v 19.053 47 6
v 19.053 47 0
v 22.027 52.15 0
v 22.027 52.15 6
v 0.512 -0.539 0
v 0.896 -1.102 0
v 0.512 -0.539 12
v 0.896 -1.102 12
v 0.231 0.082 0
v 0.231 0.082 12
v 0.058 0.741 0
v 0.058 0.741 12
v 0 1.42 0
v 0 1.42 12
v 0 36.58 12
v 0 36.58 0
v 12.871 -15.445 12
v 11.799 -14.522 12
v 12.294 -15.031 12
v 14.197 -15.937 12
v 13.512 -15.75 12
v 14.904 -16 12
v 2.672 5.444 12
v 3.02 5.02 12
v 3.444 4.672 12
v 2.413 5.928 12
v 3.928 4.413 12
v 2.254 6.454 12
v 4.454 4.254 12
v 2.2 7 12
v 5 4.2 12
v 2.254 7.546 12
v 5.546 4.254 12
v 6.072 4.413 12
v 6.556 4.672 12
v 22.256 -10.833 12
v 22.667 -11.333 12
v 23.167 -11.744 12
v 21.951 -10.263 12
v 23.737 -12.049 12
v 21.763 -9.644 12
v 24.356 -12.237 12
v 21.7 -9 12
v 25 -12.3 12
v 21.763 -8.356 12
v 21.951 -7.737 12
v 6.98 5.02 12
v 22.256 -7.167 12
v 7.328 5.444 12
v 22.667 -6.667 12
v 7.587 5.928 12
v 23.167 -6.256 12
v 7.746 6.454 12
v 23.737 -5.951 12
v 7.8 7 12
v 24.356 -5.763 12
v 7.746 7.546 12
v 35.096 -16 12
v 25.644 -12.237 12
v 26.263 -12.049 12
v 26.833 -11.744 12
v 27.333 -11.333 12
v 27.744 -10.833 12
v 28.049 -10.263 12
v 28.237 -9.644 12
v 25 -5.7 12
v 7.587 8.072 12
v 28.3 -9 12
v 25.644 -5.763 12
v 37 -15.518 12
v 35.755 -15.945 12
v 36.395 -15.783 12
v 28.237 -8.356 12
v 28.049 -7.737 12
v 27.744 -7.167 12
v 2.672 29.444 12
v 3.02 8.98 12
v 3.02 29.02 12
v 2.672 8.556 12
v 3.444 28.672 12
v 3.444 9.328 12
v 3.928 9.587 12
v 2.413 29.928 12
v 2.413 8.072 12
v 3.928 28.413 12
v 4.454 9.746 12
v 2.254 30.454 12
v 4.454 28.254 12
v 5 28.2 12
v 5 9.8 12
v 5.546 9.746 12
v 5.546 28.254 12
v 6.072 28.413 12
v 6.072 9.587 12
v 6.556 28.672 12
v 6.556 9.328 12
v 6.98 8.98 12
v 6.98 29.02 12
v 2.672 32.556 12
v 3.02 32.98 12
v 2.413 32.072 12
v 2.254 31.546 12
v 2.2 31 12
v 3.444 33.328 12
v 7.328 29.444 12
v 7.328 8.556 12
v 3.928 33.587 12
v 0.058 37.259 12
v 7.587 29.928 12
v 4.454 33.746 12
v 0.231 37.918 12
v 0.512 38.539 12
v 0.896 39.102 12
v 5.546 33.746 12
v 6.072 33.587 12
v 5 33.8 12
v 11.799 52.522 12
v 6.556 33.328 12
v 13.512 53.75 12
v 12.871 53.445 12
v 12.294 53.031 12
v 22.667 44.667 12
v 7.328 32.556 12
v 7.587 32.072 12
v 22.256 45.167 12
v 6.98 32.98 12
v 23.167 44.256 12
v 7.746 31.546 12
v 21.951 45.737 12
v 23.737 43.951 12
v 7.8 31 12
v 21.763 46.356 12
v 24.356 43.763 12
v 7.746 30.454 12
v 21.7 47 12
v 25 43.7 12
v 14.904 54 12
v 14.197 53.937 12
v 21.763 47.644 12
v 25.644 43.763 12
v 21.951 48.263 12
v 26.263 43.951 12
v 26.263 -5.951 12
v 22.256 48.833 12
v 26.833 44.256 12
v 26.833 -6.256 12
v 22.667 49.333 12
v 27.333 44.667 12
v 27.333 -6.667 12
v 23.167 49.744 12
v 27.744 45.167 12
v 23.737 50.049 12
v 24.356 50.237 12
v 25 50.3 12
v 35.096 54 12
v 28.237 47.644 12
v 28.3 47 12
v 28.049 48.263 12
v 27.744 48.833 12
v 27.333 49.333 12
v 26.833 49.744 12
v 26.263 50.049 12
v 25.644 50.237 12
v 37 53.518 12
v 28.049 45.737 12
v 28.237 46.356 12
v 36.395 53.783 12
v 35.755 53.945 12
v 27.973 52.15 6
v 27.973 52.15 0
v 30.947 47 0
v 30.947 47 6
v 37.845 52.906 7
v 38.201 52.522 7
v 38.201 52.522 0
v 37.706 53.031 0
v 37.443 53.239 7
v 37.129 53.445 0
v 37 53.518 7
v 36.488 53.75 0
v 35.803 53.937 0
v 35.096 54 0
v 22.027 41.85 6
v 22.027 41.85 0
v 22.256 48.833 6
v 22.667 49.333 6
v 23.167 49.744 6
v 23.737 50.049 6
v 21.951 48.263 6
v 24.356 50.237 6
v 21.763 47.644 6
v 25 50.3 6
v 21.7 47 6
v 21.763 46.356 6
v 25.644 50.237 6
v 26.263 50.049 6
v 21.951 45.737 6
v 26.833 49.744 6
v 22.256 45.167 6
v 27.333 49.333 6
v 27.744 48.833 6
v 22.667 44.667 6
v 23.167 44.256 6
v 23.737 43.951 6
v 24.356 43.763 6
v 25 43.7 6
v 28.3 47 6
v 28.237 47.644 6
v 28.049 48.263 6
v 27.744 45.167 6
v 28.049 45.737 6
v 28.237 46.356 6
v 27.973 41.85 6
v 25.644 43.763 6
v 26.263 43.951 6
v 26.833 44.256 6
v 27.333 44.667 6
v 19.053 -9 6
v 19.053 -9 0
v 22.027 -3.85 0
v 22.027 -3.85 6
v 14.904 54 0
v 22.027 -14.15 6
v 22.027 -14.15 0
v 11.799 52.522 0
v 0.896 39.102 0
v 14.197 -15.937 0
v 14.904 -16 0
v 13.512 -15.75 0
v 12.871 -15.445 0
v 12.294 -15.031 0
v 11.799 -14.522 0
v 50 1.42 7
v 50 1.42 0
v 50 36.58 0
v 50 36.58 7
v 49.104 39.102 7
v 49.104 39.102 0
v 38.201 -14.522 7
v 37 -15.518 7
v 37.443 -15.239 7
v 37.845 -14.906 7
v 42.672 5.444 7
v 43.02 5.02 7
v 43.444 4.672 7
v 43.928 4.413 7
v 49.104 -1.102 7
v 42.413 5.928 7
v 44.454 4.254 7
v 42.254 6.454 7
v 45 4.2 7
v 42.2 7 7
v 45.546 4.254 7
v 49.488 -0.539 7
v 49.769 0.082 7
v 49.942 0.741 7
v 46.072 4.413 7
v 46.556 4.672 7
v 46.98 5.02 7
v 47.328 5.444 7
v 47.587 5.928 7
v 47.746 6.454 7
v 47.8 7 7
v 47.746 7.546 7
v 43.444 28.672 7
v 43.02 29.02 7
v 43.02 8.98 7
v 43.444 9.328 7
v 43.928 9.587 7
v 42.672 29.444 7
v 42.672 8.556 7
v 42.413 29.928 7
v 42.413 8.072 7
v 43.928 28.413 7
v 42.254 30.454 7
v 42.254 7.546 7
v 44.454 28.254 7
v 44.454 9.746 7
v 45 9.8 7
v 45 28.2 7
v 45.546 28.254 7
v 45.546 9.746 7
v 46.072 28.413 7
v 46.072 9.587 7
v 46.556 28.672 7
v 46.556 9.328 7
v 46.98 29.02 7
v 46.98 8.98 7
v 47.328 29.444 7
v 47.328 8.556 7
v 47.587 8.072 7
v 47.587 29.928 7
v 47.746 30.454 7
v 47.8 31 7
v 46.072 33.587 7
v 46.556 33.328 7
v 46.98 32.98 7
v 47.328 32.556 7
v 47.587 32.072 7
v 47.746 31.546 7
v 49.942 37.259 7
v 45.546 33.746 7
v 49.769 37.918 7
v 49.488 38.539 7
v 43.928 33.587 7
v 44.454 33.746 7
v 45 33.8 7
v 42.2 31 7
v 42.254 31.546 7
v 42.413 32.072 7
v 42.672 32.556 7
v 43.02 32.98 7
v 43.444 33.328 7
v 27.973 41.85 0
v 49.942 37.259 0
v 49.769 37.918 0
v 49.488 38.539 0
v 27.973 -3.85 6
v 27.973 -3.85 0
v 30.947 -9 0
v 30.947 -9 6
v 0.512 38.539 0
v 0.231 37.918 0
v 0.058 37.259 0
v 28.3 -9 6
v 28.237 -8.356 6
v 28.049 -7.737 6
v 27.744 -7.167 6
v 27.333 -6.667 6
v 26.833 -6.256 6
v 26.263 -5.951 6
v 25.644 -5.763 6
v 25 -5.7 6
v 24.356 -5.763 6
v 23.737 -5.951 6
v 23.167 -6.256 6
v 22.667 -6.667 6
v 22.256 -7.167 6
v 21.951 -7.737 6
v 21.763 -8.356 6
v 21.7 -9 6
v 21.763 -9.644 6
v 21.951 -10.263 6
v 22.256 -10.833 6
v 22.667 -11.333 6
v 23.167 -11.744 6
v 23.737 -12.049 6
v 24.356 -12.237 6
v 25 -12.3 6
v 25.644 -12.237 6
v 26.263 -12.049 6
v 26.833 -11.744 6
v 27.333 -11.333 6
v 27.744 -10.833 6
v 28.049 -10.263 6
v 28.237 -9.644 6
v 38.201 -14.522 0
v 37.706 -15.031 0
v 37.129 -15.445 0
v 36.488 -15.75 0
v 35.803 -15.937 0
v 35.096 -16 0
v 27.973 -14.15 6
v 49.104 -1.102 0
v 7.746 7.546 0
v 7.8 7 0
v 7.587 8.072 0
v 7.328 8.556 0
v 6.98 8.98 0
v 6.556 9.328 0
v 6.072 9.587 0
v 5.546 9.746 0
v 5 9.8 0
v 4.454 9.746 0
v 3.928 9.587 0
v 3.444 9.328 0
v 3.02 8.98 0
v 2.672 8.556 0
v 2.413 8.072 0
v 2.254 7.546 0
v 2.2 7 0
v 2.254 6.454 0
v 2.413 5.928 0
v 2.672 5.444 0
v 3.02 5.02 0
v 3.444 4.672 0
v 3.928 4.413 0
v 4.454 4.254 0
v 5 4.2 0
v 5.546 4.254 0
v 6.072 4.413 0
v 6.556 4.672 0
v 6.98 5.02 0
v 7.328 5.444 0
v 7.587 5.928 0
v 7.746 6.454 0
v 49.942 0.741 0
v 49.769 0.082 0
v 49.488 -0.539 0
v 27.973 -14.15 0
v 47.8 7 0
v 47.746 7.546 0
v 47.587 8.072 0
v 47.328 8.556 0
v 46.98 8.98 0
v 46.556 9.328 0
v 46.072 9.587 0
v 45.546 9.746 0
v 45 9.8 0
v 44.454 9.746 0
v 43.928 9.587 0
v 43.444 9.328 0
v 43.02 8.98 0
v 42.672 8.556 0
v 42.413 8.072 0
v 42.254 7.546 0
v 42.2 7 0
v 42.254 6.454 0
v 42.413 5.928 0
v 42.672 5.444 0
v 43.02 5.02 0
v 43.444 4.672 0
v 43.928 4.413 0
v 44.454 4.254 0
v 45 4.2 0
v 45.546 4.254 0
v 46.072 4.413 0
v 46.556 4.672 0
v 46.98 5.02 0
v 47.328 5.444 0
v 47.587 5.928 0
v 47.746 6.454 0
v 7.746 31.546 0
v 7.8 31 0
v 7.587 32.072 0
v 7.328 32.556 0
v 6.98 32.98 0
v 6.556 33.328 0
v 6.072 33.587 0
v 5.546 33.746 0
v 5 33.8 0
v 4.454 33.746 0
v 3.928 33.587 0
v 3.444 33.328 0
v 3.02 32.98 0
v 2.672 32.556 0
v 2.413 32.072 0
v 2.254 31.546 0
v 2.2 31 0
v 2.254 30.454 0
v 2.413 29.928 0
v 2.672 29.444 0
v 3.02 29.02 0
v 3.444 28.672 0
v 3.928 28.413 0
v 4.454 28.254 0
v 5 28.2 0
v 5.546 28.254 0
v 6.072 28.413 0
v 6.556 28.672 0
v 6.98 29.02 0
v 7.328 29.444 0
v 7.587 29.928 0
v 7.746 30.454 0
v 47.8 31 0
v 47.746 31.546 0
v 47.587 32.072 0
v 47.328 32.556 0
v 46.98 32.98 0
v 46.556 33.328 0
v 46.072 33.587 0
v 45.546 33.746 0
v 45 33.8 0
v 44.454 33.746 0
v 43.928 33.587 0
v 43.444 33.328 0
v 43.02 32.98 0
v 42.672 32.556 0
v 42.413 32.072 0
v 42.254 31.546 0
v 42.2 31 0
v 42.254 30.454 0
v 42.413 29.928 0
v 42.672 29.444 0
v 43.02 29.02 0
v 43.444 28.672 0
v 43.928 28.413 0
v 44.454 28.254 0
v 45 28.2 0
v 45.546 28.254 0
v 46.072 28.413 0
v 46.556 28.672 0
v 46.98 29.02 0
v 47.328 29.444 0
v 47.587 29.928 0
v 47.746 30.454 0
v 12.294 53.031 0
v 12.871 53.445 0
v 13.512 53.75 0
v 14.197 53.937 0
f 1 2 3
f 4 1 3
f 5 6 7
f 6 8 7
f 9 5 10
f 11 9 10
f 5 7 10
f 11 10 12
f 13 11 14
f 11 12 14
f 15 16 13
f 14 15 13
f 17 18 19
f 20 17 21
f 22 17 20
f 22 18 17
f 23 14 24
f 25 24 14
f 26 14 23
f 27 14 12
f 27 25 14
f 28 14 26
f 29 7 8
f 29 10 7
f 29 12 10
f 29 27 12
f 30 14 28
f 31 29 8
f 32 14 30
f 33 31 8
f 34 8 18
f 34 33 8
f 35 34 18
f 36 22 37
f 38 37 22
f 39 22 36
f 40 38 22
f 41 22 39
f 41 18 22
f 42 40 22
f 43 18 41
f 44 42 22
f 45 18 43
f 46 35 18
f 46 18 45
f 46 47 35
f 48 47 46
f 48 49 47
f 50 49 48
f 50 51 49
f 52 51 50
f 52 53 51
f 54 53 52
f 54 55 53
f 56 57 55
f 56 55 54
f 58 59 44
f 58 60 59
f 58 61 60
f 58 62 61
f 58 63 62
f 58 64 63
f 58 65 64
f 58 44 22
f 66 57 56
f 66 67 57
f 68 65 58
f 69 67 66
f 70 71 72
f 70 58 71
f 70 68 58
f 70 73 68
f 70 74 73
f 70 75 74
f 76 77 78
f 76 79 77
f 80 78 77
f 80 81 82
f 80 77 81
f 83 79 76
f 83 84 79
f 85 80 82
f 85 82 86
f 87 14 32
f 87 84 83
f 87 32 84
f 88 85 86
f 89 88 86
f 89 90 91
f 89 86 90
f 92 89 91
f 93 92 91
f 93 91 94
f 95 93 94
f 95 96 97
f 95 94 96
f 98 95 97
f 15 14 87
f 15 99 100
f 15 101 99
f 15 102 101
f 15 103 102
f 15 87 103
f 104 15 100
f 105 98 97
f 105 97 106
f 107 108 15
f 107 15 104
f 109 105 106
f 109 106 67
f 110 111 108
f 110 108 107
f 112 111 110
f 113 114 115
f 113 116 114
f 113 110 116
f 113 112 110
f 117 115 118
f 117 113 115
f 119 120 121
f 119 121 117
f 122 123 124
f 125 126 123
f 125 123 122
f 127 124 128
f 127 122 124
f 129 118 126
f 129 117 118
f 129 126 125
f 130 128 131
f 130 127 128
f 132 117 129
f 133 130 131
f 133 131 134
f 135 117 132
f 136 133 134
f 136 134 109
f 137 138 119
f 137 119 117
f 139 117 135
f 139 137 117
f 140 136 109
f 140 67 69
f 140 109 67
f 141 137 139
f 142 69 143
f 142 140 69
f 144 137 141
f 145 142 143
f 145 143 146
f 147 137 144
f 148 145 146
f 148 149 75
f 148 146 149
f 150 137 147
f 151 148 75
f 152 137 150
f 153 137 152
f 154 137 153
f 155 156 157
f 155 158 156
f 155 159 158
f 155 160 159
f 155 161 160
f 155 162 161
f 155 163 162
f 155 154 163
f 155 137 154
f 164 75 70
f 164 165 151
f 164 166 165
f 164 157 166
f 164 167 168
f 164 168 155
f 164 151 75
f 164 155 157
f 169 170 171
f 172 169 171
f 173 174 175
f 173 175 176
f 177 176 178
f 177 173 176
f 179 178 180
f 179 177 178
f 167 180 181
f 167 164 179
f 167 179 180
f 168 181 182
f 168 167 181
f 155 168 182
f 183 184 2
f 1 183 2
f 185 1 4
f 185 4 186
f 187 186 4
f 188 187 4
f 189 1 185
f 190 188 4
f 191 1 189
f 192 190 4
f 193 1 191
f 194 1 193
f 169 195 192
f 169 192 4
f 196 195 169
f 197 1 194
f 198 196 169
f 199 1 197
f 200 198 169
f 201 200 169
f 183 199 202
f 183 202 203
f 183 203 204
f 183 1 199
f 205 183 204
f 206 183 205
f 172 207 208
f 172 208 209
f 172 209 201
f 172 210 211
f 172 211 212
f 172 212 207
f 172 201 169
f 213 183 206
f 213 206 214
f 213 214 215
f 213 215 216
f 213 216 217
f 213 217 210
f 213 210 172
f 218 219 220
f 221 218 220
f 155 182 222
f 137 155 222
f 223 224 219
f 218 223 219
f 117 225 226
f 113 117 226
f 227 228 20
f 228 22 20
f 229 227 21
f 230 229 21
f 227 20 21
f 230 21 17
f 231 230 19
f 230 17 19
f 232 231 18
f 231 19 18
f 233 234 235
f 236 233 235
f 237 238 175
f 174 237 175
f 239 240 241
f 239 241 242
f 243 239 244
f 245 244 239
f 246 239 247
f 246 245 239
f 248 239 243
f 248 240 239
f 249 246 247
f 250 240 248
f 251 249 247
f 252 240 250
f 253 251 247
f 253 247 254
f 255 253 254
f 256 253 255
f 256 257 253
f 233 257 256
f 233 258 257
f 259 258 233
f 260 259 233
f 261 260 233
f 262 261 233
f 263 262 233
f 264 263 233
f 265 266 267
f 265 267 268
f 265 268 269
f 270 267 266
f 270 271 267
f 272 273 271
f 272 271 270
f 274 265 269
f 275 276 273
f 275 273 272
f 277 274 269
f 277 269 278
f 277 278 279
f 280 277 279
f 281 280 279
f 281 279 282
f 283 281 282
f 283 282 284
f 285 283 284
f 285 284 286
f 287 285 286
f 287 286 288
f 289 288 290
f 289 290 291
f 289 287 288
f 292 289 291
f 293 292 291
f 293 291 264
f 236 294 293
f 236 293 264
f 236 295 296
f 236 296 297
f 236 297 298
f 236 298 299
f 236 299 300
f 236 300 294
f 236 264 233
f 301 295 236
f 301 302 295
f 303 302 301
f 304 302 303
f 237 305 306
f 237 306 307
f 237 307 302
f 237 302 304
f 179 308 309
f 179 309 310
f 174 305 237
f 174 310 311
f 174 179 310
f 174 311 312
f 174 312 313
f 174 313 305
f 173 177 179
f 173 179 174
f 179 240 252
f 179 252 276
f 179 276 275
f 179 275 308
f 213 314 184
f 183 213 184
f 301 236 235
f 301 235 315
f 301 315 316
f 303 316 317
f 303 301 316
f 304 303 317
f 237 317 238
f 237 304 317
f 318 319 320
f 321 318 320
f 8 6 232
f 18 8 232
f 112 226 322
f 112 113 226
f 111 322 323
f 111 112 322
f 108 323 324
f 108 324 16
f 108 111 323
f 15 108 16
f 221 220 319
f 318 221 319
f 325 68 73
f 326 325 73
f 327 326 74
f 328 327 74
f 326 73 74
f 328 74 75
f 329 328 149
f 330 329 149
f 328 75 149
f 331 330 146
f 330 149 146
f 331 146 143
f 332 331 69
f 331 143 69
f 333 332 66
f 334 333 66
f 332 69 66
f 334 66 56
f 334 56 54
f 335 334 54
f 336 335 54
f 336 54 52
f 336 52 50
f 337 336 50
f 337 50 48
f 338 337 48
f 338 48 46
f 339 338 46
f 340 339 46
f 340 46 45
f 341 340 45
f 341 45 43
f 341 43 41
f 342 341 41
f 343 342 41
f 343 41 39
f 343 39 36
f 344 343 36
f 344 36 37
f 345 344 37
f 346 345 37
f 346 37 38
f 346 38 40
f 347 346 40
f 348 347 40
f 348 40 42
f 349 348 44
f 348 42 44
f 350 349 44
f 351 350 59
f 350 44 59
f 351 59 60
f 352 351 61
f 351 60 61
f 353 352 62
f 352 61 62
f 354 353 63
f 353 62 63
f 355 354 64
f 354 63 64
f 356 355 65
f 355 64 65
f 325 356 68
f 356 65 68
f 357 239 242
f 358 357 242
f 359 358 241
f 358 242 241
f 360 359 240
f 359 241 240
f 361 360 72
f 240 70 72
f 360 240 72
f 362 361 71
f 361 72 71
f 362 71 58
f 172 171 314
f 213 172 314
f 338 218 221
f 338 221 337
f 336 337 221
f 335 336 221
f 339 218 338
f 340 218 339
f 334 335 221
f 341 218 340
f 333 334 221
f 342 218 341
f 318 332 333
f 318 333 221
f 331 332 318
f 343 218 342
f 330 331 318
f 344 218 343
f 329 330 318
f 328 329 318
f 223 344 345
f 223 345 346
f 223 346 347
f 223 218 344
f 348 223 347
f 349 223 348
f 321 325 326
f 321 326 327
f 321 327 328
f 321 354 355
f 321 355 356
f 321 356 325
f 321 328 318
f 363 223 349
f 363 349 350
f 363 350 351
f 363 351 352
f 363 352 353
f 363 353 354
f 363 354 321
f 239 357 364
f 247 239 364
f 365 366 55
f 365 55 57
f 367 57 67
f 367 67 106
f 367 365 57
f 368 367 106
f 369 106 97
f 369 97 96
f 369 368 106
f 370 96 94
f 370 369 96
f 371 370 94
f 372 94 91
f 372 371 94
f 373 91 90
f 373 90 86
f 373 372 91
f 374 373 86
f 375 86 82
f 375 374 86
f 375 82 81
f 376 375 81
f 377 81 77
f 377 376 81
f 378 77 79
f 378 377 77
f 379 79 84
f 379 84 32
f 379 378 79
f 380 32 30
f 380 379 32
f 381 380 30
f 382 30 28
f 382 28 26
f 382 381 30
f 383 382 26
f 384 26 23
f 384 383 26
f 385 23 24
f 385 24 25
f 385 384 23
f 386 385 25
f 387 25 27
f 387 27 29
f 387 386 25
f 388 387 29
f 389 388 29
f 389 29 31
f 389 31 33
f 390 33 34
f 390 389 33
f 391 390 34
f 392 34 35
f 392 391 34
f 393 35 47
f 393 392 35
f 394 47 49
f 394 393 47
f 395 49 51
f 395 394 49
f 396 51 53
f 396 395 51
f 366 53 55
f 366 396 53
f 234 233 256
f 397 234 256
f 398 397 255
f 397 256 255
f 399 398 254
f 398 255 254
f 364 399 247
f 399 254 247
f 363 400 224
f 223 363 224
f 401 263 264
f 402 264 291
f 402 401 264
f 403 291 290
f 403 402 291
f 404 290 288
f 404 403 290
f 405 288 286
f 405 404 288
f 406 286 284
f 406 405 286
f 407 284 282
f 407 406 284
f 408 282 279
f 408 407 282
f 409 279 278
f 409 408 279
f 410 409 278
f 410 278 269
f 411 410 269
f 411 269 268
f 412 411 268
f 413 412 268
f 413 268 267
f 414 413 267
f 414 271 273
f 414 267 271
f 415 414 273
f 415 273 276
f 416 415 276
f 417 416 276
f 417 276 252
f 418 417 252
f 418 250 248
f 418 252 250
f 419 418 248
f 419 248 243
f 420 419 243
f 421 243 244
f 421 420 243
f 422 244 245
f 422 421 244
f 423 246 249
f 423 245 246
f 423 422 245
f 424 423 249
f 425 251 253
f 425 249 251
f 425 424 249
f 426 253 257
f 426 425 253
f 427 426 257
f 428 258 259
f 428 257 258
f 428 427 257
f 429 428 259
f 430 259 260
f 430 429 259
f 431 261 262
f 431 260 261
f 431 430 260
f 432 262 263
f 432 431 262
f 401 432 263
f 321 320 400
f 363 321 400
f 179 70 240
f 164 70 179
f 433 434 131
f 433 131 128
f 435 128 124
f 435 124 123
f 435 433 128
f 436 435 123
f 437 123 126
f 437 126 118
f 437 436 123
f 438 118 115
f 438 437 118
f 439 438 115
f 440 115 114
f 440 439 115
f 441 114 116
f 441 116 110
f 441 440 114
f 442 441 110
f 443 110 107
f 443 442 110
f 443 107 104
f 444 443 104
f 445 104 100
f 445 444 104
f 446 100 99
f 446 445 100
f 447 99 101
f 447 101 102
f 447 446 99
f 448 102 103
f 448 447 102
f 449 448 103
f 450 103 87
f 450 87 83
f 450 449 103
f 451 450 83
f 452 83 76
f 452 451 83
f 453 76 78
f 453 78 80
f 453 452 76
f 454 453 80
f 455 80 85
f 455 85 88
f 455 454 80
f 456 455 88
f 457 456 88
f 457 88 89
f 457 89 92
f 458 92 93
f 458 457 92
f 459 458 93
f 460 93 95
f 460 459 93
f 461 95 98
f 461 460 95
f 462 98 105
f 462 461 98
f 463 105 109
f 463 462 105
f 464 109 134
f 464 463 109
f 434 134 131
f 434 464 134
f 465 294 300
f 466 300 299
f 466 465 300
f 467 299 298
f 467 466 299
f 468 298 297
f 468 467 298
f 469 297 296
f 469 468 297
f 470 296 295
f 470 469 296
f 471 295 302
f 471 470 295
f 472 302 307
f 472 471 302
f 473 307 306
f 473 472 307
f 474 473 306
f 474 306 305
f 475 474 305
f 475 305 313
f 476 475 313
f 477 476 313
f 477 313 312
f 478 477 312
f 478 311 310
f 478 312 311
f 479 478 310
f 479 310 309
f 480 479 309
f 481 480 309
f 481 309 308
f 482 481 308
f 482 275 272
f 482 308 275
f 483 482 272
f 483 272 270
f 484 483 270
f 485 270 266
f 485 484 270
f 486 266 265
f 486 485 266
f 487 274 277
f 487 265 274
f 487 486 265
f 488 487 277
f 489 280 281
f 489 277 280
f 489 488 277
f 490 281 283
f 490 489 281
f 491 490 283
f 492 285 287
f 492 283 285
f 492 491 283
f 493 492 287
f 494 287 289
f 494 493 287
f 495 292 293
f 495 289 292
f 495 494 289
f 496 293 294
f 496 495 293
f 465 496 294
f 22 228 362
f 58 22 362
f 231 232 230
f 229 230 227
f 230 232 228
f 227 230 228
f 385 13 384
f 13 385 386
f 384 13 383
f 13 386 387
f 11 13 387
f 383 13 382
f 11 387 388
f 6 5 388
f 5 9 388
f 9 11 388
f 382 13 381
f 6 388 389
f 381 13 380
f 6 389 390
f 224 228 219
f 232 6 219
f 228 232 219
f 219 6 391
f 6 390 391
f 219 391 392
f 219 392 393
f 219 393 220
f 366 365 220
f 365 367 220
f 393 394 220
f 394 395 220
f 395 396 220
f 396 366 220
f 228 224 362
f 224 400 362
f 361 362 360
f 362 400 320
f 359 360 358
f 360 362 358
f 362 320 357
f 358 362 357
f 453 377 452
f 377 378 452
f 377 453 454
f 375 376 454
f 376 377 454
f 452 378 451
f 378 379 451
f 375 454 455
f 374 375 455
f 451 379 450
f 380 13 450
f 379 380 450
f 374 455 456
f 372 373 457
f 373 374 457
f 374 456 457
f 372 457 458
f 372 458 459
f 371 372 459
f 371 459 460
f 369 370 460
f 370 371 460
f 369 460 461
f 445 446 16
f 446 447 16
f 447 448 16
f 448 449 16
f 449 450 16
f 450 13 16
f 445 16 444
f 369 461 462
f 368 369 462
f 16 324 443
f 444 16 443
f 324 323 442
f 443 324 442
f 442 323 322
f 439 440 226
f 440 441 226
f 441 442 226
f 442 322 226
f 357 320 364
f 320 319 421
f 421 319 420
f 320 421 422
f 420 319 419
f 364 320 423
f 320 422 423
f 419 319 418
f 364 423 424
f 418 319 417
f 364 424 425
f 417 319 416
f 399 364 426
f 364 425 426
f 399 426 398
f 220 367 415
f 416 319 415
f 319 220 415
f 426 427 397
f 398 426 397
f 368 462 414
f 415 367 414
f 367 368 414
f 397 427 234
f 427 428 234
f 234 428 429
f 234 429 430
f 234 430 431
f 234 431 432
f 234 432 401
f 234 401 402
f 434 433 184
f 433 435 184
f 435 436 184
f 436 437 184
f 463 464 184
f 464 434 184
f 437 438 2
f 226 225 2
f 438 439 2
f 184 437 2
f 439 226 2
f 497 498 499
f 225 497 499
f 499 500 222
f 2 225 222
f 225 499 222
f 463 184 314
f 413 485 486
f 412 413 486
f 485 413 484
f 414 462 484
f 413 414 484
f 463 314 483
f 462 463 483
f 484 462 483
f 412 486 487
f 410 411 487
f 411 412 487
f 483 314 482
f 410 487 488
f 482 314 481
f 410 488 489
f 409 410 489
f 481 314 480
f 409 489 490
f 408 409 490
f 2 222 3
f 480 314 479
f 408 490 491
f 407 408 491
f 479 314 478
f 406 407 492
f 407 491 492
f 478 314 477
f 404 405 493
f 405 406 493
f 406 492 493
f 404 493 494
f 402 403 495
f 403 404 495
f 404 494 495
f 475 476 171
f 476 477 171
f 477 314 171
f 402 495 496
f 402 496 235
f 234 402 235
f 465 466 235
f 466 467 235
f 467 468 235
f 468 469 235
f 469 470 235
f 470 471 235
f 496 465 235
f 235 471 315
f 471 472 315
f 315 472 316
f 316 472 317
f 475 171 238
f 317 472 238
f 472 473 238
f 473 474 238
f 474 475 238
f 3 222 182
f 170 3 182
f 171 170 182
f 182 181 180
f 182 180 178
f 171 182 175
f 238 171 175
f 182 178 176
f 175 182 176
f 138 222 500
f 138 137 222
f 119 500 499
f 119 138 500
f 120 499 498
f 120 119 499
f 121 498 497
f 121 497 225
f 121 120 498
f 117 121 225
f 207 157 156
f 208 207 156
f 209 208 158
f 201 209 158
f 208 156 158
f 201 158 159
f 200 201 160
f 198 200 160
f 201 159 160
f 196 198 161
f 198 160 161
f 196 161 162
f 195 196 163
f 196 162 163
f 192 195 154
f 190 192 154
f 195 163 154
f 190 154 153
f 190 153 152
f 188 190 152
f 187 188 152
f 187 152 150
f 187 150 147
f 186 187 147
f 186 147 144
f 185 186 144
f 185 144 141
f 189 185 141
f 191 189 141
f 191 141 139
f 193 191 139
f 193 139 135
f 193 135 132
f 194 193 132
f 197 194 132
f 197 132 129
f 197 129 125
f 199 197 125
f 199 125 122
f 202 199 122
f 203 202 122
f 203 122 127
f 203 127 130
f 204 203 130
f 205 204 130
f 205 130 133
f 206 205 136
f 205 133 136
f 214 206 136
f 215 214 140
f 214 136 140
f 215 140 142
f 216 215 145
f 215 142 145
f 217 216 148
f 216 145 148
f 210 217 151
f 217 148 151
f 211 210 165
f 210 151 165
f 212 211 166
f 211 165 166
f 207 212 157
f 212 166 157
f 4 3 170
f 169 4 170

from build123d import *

# Parameters (mm, degrees)
SKETCH_R        = 2.8
PAD_DEPTH       = 12
SKETCH001_R     = 3.3
POCKET_DEPTH    = 12.001
POCKET001_DEPTH = 6
FILLET_R        = 4
SKETCH003_W     = 13
SKETCH003_H     = 70
POCKET002_DEPTH = 5


with BuildPart() as part:
    # Sketch → Pad (new body)
    with BuildSketch(Plane.XY):
        Polygon((50, 0), (50, 38), (37, 54), (13, 54), (0, 38), (0, 0), (13, -16), (37, -16), align=None)
        with Locations((5, 31)):
            Circle(SKETCH_R, mode=Mode.SUBTRACT)
        with Locations((45, 31)):
            Circle(SKETCH_R, mode=Mode.SUBTRACT)
        with Locations((45, 7)):
            Circle(SKETCH_R, mode=Mode.SUBTRACT)
        with Locations((5, 7)):
            Circle(SKETCH_R, mode=Mode.SUBTRACT)
    extrude(amount=PAD_DEPTH)

    # Sketch001 (on Face14 of Pad) → Pocket (cut, through all)
    with BuildSketch(Plane.XY.offset(12)):
        with Locations((25, 47)):
            Circle(SKETCH001_R)
        with Locations((25, -9)):
            Circle(SKETCH001_R)
    extrude(amount=-POCKET_DEPTH, mode=Mode.SUBTRACT)

    # Sketch002 (on Face4 of Pocket) → Pocket001 (cut)
    with BuildSketch(Plane(origin=(0, 0, 0), x_dir=(1, 0, 0), z_dir=(0, 0, -1))):
        Polygon((27.973354, -52.15), (30.946708, -47), (27.973354, -41.85), (22.026646, -41.85), (19.053292, -47), (22.026646, -52.15), align=None)
        Polygon((27.973354, 3.85), (30.946708, 9), (27.973354, 14.15), (22.026646, 14.15), (19.053292, 9), (22.026646, 3.85), align=None)
    extrude(amount=-POCKET001_DEPTH, mode=Mode.SUBTRACT)

    # Fillet
    fillet_edges = [part.edges().sort_by_distance(p)[0] for p in [
        (0, 38, 6),
        (13, 54, 6),
        (37, 54, 6),
        (0, 0, 6),
        (13, -16, 6),
        (37, -16, 6),
        (50, 0, 6),
        (50, 38, 6),
    ]]
    fillet(fillet_edges, radius=FILLET_R)

    # Sketch003 (on Face5 of Fillet) → Pocket002 (cut)
    with BuildSketch(Plane.XY.offset(12)):
        with Locations((43.5, 19)):
            Rectangle(SKETCH003_W, SKETCH003_H)
    extrude(amount=-POCKET002_DEPTH, mode=Mode.SUBTRACT)


solid = part.part
